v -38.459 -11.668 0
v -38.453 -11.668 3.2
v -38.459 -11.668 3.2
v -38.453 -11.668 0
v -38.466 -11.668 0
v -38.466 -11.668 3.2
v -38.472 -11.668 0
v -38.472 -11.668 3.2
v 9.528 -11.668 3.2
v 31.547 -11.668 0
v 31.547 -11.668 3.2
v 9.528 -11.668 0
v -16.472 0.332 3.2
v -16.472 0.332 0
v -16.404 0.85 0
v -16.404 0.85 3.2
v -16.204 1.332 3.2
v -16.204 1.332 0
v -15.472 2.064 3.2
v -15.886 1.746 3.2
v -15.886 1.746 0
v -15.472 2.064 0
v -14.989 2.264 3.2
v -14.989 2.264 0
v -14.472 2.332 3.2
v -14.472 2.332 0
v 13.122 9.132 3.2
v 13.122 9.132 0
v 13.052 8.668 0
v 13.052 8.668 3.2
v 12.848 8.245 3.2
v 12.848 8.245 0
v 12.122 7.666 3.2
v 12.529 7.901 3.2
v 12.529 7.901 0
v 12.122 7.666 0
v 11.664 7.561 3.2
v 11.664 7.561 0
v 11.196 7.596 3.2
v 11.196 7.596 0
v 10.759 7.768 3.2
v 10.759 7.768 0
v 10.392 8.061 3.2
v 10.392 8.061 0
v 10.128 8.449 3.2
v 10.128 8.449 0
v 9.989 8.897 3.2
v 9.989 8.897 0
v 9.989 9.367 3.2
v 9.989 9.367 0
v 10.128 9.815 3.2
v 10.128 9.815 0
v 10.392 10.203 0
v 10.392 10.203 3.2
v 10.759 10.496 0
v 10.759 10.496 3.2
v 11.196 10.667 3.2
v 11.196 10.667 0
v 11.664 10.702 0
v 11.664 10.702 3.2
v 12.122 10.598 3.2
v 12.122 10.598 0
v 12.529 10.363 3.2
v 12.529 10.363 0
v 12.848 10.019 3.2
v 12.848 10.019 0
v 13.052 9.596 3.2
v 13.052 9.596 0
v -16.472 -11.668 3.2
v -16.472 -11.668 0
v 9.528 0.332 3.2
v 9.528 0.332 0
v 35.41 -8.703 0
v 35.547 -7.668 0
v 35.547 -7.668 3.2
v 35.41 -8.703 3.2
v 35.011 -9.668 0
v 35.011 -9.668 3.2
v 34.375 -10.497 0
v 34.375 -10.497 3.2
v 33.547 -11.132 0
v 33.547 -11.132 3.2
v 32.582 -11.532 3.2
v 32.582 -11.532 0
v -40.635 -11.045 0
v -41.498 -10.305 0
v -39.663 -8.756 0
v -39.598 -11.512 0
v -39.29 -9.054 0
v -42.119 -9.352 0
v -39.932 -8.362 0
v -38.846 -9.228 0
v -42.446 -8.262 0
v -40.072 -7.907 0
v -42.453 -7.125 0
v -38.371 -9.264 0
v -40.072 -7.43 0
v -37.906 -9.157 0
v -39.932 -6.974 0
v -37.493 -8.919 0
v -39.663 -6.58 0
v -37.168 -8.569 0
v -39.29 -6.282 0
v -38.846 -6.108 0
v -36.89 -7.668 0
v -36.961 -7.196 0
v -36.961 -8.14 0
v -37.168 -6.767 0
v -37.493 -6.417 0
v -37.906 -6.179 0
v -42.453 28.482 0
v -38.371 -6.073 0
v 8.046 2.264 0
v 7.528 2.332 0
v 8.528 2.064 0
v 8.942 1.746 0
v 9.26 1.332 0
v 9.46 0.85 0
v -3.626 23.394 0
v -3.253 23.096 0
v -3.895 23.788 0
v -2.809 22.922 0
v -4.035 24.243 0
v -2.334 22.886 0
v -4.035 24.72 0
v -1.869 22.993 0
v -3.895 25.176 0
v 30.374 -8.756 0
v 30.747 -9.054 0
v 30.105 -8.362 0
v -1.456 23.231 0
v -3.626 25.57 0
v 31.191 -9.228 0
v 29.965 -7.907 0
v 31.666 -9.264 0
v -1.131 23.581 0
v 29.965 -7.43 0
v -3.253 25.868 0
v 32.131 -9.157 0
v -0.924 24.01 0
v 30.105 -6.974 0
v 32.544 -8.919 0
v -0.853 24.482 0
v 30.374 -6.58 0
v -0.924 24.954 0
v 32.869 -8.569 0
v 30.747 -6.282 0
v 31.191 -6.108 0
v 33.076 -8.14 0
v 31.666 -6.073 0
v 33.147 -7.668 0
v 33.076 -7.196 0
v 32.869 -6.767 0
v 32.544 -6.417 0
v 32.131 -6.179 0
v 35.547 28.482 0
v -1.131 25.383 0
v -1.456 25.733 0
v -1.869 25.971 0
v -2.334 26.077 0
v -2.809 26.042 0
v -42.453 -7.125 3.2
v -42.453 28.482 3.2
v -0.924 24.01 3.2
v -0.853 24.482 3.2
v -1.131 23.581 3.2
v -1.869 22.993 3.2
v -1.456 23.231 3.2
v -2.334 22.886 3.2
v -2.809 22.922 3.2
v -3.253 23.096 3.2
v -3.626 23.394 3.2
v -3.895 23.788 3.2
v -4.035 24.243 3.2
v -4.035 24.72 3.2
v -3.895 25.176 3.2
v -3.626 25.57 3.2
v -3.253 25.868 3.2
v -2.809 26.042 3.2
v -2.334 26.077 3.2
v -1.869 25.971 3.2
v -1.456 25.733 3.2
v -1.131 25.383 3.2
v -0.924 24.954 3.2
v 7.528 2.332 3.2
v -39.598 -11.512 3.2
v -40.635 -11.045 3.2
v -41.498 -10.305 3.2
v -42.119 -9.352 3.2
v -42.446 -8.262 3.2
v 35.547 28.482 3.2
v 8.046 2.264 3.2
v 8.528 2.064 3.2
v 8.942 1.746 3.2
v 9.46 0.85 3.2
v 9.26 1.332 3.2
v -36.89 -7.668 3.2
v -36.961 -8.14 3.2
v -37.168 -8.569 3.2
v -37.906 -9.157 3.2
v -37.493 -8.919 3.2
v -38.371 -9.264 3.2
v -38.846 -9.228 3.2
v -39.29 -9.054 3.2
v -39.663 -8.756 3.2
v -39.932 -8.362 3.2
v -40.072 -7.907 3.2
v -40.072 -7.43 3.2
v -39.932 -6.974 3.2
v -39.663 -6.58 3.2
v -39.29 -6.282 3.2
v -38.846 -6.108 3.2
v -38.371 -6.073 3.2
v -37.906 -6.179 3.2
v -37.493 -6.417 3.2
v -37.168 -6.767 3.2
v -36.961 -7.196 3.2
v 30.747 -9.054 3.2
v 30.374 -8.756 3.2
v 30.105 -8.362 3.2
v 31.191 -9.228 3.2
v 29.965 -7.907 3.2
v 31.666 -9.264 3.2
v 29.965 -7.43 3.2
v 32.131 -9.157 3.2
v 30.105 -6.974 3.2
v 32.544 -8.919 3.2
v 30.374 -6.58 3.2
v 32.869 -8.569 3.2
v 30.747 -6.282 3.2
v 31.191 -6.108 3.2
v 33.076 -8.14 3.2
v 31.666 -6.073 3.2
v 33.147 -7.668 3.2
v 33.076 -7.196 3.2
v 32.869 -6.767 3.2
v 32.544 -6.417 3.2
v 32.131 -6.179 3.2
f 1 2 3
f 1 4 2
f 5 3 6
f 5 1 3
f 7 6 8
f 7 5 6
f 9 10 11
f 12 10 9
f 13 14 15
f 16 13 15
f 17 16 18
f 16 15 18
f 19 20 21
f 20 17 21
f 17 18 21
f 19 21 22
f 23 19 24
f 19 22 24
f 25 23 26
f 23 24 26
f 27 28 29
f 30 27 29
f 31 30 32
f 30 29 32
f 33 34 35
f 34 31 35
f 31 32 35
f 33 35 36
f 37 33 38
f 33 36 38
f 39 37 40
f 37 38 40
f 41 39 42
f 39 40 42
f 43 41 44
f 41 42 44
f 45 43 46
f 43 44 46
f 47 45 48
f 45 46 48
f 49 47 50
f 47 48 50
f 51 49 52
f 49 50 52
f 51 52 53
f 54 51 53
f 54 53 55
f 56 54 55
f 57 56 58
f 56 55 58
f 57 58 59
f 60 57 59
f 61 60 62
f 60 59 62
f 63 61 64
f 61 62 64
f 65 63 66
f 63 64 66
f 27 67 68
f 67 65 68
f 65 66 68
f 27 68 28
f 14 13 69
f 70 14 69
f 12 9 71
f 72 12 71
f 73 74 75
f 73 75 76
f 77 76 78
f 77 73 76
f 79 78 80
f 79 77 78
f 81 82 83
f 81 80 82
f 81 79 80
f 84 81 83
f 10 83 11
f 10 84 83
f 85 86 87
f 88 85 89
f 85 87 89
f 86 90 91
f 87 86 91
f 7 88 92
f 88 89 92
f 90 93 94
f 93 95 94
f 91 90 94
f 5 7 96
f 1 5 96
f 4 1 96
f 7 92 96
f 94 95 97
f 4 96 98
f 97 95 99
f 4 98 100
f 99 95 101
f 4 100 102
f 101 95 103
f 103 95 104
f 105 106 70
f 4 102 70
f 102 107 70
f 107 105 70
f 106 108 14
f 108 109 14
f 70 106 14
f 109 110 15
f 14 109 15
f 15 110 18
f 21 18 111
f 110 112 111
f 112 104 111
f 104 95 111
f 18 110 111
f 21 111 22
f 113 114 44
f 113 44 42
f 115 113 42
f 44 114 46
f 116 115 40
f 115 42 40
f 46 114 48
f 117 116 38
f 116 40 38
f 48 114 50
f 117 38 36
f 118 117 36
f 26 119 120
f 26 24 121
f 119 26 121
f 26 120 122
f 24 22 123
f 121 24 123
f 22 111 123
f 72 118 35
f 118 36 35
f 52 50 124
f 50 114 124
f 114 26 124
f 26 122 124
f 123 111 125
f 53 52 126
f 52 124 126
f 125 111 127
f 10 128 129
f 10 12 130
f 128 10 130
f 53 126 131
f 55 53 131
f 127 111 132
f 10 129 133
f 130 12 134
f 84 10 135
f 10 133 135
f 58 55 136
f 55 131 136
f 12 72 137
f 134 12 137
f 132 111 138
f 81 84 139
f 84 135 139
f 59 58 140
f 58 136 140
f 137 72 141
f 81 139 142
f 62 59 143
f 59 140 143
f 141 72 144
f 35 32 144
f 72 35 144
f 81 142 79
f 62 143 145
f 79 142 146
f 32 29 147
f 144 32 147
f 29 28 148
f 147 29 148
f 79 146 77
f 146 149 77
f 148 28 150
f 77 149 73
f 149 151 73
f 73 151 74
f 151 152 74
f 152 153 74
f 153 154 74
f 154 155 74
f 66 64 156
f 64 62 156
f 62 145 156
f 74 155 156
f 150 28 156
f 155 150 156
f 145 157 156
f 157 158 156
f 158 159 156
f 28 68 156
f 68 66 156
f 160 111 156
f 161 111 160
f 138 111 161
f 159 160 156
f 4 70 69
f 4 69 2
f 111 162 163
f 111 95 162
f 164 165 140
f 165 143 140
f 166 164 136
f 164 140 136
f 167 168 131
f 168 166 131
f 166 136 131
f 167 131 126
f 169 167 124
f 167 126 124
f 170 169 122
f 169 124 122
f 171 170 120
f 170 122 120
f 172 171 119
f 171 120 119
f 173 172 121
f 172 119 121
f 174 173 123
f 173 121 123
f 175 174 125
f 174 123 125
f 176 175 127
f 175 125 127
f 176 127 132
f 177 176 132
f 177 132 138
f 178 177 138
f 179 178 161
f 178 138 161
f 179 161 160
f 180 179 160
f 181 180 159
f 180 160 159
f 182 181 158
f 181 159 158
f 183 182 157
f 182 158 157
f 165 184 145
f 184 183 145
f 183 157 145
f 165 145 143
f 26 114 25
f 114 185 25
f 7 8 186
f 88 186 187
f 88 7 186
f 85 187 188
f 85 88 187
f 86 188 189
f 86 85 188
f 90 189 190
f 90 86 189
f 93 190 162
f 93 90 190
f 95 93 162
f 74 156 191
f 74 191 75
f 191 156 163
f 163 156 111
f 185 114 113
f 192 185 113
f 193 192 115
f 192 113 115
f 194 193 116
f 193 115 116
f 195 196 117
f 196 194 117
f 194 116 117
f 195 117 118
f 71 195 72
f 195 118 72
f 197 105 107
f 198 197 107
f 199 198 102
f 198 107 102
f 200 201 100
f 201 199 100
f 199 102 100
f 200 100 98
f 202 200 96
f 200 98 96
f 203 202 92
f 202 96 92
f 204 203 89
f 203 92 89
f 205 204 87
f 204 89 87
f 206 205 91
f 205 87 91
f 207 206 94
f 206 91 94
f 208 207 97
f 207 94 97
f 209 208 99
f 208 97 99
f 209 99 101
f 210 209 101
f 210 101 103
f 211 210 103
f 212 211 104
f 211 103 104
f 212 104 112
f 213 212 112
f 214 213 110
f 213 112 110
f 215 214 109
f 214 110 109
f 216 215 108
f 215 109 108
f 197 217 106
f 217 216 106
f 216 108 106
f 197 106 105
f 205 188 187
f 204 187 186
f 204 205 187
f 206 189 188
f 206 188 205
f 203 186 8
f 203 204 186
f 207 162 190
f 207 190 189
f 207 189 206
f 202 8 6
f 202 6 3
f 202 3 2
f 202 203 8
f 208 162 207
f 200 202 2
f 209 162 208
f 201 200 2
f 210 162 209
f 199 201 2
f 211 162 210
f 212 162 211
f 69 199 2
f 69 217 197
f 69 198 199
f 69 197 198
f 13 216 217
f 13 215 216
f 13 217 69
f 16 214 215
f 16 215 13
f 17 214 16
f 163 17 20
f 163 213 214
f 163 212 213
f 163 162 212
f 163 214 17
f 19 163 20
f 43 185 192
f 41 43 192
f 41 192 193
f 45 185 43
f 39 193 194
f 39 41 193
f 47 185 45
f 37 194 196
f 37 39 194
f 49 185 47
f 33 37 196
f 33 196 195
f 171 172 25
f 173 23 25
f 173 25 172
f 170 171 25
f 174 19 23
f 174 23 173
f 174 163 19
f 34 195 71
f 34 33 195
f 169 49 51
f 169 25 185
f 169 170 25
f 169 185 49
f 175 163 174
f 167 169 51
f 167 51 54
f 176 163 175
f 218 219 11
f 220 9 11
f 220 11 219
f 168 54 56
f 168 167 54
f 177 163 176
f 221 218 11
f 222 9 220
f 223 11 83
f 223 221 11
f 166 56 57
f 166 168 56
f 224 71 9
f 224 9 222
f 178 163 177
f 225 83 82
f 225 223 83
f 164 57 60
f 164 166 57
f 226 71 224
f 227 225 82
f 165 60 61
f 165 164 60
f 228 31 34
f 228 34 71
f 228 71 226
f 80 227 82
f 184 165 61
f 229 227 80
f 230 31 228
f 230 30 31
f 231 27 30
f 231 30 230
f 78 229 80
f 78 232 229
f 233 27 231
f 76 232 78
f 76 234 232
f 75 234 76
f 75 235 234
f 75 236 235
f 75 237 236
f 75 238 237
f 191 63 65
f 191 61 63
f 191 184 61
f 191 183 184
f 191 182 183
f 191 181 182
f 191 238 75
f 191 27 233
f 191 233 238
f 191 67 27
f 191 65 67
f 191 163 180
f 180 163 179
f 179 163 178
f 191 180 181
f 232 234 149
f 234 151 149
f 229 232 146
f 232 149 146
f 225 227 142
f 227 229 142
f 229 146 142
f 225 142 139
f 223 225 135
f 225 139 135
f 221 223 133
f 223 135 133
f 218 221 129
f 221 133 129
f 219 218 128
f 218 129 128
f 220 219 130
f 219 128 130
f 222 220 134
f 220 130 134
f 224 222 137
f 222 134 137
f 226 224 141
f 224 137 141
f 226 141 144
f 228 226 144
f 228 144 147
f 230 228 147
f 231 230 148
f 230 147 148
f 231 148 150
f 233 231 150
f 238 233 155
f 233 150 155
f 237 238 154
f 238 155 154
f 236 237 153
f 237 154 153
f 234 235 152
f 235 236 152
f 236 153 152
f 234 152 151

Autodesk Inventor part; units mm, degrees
ref_plane "YZ Plane" through (0, 0, 0) normal (1, 0, 0) x (0, 1, 0)
ref_plane "XZ Plane" through (0, 0, 0) normal (0, 1, 0) x (-1, 0, 0)
ref_plane "XY Plane" through (0, 0, 0) normal (0, 0, 1) x (1, 0, 0)
sketch "Эскиз1" plane through (0, 0, 0) normal (0, 0, 1) x (1, 0, 0)
  line L0 (27.5467, -7.6681) -> (1.5467, -7.6681)
  line L1 (-6.4533, -7.6681) -> (-34.4903, -7.6681)
  line L2 (-34.4903, -7.6681) -> (-6.4533, -7.6681)
  line L3 (1.5467, -7.6681) -> (27.5467, -7.6681)
  line L4 (27.5467, -7.6681) -> (27.5467, 28.4819)
  line L5 (27.5467, 28.4819) -> (-2.4533, 28.4819)
  line L6 (-2.4533, 28.4819) -> (-34.4903, 28.4819)
  line L7 (-34.4903, 28.4819) -> (-34.4903, -7.6681)
  line L8 (-34.4903, 13.2319) -> (-34.4903, 5.0319)
  line L9 (-34.4903, 3.2319) -> (-34.4903, -7.6681)
  circle A0 centre (11.5467, 9.1319) radius 1.575
  circle A1 centre (-2.4533, 24.4819) radius 1.6
  line L10 (-6.4533, -7.6681) -> (1.5467, -7.6681)
  line L11 (-16.4718, -11.6681) -> (-16.4718, -18.4681) projected
  line L12 (9.5282, -11.6681) -> (9.5282, -18.4681) projected
  line L13 (-16.4718, -18.4681) -> (9.5282, -18.4681) projected
  circle A2 centre (-38.4903, -7.6681) radius 1.6 projected
  circle A3 centre (31.5467, -7.6681) radius 1.6 projected
  arc A4 (31.5467, -11.6681) -> (27.5467, -7.6681) centre (31.5467, -7.6681) ccw projected
  line L14 (27.5467, -7.6681) -> (9.5282, -7.6681) projected
  arc A5 (-34.4903, -7.6681) -> (-38.4718, -11.6681) centre (-38.4903, -7.6681) ccw projected
  arc A6 (-38.4718, -11.6681) -> (-38.4533, -11.6681) centre (-38.4533, -7.6681) ccw projected
  line L15 (-38.4533, -11.6681) -> (-34.4903, -11.6681) projected
  arc A7 (-19.6718, -21.6681) -> (-34.4903, -11.6681) centre (-35.1698, -28.6545) ccw projected
  line L16 (12.7282, -21.6681) -> (-19.6718, -21.6681) projected
  arc A8 (27.5467, -11.6681) -> (12.7282, -21.6681) centre (28.2263, -28.6545) ccw projected
  line L17 (27.5467, -11.6681) -> (31.5467, -11.6681) projected
  arc A9 (35.5467, -7.6681) -> (27.5467, -7.6681) centre (31.5467, -7.6681) ccw projected
  line L18 (35.5467, 28.4819) -> (35.5467, -7.6681) projected
  line L19 (35.5467, 28.4819) -> (-2.4533, 28.4819) projected
  circle A10 centre (-2.4533, 24.4819) radius 4 projected
  line L20 (-2.4533, 28.4819) -> (-42.4533, 28.4819) projected
  line L21 (-42.4533, -7.1253) -> (-42.4533, 28.4819) projected
  arc A11 (-34.4903, -7.6681) -> (-42.4533, -7.1253) centre (-38.4903, -7.6681) ccw projected
  line L22 (-34.4903, -7.6681) -> (27.5467, -7.6681) projected
  arc A12 (-34.4903, 3.2319) -> (-34.4903, 5.0319) centre (-30.4903, 4.1319) ccw projected
  line L23 (-34.4903, 3.2319) -> (-34.4903, 5.0319) projected
  line L24 (-34.4903, 13.2319) -> (-34.4903, 15.0319) projected
  arc A13 (-34.4903, 13.2319) -> (-34.4903, 15.0319) centre (-30.4903, 14.1319) ccw projected
  circle A14 centre (17.5097, 4.1319) radius 4.1 projected
  circle A15 centre (-16.4533, 9.1319) radius 7 projected
  circle A16 centre (11.5467, 9.1319) radius 3.5 projected
  circle A17 centre (17.5097, 14.1319) radius 4.1 projected
  line L25 (35.5467, 28.4819) -> (27.5467, 28.4819)
  line L26 (27.5467, 28.4819) -> (27.5467, -11.6681)
  line L27 (27.5467, -11.6681) -> (35.5467, -11.6681)
  line L28 (35.5467, -11.6681) -> (35.5467, 28.4819)
  line L29 (-42.4533, 28.4819) -> (-34.4903, 28.4819)
  line L30 (-34.4903, 28.4819) -> (-34.4903, -11.6681)
  line L31 (-34.4903, -11.6681) -> (-42.4533, -11.6681)
  line L32 (-42.4533, -11.6681) -> (-42.4533, 28.4819)
  line L33 (27.5467, -11.6681) -> (-34.4903, -11.6681)
  line L34 (-34.4903, -11.6681) -> (-34.4903, -7.6681)
  line L35 (-34.4903, -7.6681) -> (27.5467, -7.6681)
  line L36 (27.5467, -7.6681) -> (27.5467, -11.6681)
  line L37 (9.5282, -7.6681) -> (9.5282, -11.6681) projected
  line L38 (-16.4718, -11.6681) -> (-16.4718, -7.6681) projected
  line L39 (-16.4718, -7.6681) -> (-34.4903, -7.6681) projected
  point P0 (0, 0)
  point P1 (-2.4533, -2.0181)
  point P2 (1.5467, -7.6681)
  point P3 (-42.4533, -8.2109)
extrude "Выдавливание1" add sketch "Эскиз1" along normal blind 3.2 contours L26 L33 L37 L0 | A10 | L0 L10 L1 L7 A12 A13 L6 L5 L4 | L4 L19 L18 A4 | A4 L17 L26 | L37 L33 L38 L1 L10 L0 | L33 L30 L1 L38 | L7 A5 L21 L20 | L15 A6 A5 L32 L30 | A13 L7 | L32 A5 | L7 A12 | A14 | A15 | A16 | A17
sketch "Эскиз2" plane through (0, 0, 3.2) normal (0, 0, 1) x (1, 0, 0)
  line L0 (-16.4718, -7.6681) -> (-13.4718, -7.6681) projected
  line L1 (6.5282, -7.6681) -> (9.5282, -7.6681) projected
  line L2 (-38.4533, -11.6681) -> (31.5467, -11.6681) projected
  line L3 (9.5282, -11.6681) -> (-16.4718, -11.6681)
  line L4 (-16.4718, -11.6681) -> (-16.4718, -7.6681)
  line L5 (-16.4718, -7.6681) -> (9.5282, -7.6681)
  line L6 (9.5282, -7.6681) -> (9.5282, -11.6681)
  line L7 (-16.4718, -7.6681) -> (9.5282, -7.6681)
  line L8 (9.5282, -7.6681) -> (9.5282, 2.3319)
  line L9 (9.5282, 2.3319) -> (-16.4718, 2.3319)
  line L10 (-16.4718, 2.3319) -> (-16.4718, -7.6681)
  point P0 (0, 0)
  point P1 (-16.4718, -11.6681)
  dimension "d4" = 26
  dimension "d5" = 10
extrude "Выдавливание2" cut sketch "Эскиз2" against normal blind 3.2
fillet "Сопряжение1" radius 2 2 edges at (9.5282, 2.3319, 1.6) (-16.4718, 2.3319, 1.6)
properties part number "крышка захвата"
